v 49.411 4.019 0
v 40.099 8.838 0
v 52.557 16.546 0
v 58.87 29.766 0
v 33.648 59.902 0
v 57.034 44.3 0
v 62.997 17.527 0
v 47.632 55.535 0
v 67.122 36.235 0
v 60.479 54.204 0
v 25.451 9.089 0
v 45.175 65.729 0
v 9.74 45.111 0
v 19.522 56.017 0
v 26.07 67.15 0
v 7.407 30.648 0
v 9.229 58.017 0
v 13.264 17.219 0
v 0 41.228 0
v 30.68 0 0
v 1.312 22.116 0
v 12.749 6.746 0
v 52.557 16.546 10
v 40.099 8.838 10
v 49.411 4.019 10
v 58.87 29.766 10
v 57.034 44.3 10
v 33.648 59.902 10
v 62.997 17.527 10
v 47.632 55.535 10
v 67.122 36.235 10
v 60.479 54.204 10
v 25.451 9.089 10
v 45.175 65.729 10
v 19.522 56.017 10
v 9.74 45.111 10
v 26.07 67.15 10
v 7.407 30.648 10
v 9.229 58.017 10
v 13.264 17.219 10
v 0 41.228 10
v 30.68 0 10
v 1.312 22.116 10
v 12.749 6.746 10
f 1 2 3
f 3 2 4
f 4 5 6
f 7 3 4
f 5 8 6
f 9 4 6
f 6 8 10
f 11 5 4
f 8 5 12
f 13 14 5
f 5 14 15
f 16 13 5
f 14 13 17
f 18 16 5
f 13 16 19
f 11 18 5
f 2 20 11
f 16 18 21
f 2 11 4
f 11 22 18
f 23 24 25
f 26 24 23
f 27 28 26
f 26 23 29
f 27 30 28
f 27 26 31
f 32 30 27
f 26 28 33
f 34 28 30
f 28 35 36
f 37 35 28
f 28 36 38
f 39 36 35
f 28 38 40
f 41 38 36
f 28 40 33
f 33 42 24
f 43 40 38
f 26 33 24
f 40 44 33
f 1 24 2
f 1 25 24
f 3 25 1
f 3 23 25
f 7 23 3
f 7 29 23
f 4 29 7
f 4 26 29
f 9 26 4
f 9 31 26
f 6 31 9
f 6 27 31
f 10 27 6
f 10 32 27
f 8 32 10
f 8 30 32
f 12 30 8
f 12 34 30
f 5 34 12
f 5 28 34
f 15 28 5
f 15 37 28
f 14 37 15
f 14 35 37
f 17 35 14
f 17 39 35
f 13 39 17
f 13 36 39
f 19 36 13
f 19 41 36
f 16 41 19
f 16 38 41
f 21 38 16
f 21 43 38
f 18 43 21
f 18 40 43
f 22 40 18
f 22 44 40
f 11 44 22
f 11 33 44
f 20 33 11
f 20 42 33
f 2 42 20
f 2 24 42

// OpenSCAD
$fn = 32;

// ----------------------------------------------------------------------
// Chain sprocket: 11 teeth, 26 mm root radius
// ----------------------------------------------------------------------

// --- parameters (mm) ---
profile_height = 10;      // extrusion height
profile_points = 22;      // points of the closed outline

profile = [[58.87, 29.766], [67.122, 36.235], [57.034, 44.3], [60.479, 54.204], [47.632, 55.535], [45.175, 65.729], [33.648, 59.902], [26.07, 67.15], [19.522, 56.017], [9.229, 58.017], [9.74, 45.111], [0, 41.228], [7.407, 30.648], [1.312, 22.116], [13.264, 17.219], [12.749, 6.746], [25.451, 9.089], [30.68, 0], [40.099, 8.838], [49.411, 4.019], [52.557, 16.546], [62.997, 17.527]];  // single closed polygon, 22 points, counter clockwise

// --- the one profile operation ---
linear_extrude(height = profile_height) polygon(points = profile);
